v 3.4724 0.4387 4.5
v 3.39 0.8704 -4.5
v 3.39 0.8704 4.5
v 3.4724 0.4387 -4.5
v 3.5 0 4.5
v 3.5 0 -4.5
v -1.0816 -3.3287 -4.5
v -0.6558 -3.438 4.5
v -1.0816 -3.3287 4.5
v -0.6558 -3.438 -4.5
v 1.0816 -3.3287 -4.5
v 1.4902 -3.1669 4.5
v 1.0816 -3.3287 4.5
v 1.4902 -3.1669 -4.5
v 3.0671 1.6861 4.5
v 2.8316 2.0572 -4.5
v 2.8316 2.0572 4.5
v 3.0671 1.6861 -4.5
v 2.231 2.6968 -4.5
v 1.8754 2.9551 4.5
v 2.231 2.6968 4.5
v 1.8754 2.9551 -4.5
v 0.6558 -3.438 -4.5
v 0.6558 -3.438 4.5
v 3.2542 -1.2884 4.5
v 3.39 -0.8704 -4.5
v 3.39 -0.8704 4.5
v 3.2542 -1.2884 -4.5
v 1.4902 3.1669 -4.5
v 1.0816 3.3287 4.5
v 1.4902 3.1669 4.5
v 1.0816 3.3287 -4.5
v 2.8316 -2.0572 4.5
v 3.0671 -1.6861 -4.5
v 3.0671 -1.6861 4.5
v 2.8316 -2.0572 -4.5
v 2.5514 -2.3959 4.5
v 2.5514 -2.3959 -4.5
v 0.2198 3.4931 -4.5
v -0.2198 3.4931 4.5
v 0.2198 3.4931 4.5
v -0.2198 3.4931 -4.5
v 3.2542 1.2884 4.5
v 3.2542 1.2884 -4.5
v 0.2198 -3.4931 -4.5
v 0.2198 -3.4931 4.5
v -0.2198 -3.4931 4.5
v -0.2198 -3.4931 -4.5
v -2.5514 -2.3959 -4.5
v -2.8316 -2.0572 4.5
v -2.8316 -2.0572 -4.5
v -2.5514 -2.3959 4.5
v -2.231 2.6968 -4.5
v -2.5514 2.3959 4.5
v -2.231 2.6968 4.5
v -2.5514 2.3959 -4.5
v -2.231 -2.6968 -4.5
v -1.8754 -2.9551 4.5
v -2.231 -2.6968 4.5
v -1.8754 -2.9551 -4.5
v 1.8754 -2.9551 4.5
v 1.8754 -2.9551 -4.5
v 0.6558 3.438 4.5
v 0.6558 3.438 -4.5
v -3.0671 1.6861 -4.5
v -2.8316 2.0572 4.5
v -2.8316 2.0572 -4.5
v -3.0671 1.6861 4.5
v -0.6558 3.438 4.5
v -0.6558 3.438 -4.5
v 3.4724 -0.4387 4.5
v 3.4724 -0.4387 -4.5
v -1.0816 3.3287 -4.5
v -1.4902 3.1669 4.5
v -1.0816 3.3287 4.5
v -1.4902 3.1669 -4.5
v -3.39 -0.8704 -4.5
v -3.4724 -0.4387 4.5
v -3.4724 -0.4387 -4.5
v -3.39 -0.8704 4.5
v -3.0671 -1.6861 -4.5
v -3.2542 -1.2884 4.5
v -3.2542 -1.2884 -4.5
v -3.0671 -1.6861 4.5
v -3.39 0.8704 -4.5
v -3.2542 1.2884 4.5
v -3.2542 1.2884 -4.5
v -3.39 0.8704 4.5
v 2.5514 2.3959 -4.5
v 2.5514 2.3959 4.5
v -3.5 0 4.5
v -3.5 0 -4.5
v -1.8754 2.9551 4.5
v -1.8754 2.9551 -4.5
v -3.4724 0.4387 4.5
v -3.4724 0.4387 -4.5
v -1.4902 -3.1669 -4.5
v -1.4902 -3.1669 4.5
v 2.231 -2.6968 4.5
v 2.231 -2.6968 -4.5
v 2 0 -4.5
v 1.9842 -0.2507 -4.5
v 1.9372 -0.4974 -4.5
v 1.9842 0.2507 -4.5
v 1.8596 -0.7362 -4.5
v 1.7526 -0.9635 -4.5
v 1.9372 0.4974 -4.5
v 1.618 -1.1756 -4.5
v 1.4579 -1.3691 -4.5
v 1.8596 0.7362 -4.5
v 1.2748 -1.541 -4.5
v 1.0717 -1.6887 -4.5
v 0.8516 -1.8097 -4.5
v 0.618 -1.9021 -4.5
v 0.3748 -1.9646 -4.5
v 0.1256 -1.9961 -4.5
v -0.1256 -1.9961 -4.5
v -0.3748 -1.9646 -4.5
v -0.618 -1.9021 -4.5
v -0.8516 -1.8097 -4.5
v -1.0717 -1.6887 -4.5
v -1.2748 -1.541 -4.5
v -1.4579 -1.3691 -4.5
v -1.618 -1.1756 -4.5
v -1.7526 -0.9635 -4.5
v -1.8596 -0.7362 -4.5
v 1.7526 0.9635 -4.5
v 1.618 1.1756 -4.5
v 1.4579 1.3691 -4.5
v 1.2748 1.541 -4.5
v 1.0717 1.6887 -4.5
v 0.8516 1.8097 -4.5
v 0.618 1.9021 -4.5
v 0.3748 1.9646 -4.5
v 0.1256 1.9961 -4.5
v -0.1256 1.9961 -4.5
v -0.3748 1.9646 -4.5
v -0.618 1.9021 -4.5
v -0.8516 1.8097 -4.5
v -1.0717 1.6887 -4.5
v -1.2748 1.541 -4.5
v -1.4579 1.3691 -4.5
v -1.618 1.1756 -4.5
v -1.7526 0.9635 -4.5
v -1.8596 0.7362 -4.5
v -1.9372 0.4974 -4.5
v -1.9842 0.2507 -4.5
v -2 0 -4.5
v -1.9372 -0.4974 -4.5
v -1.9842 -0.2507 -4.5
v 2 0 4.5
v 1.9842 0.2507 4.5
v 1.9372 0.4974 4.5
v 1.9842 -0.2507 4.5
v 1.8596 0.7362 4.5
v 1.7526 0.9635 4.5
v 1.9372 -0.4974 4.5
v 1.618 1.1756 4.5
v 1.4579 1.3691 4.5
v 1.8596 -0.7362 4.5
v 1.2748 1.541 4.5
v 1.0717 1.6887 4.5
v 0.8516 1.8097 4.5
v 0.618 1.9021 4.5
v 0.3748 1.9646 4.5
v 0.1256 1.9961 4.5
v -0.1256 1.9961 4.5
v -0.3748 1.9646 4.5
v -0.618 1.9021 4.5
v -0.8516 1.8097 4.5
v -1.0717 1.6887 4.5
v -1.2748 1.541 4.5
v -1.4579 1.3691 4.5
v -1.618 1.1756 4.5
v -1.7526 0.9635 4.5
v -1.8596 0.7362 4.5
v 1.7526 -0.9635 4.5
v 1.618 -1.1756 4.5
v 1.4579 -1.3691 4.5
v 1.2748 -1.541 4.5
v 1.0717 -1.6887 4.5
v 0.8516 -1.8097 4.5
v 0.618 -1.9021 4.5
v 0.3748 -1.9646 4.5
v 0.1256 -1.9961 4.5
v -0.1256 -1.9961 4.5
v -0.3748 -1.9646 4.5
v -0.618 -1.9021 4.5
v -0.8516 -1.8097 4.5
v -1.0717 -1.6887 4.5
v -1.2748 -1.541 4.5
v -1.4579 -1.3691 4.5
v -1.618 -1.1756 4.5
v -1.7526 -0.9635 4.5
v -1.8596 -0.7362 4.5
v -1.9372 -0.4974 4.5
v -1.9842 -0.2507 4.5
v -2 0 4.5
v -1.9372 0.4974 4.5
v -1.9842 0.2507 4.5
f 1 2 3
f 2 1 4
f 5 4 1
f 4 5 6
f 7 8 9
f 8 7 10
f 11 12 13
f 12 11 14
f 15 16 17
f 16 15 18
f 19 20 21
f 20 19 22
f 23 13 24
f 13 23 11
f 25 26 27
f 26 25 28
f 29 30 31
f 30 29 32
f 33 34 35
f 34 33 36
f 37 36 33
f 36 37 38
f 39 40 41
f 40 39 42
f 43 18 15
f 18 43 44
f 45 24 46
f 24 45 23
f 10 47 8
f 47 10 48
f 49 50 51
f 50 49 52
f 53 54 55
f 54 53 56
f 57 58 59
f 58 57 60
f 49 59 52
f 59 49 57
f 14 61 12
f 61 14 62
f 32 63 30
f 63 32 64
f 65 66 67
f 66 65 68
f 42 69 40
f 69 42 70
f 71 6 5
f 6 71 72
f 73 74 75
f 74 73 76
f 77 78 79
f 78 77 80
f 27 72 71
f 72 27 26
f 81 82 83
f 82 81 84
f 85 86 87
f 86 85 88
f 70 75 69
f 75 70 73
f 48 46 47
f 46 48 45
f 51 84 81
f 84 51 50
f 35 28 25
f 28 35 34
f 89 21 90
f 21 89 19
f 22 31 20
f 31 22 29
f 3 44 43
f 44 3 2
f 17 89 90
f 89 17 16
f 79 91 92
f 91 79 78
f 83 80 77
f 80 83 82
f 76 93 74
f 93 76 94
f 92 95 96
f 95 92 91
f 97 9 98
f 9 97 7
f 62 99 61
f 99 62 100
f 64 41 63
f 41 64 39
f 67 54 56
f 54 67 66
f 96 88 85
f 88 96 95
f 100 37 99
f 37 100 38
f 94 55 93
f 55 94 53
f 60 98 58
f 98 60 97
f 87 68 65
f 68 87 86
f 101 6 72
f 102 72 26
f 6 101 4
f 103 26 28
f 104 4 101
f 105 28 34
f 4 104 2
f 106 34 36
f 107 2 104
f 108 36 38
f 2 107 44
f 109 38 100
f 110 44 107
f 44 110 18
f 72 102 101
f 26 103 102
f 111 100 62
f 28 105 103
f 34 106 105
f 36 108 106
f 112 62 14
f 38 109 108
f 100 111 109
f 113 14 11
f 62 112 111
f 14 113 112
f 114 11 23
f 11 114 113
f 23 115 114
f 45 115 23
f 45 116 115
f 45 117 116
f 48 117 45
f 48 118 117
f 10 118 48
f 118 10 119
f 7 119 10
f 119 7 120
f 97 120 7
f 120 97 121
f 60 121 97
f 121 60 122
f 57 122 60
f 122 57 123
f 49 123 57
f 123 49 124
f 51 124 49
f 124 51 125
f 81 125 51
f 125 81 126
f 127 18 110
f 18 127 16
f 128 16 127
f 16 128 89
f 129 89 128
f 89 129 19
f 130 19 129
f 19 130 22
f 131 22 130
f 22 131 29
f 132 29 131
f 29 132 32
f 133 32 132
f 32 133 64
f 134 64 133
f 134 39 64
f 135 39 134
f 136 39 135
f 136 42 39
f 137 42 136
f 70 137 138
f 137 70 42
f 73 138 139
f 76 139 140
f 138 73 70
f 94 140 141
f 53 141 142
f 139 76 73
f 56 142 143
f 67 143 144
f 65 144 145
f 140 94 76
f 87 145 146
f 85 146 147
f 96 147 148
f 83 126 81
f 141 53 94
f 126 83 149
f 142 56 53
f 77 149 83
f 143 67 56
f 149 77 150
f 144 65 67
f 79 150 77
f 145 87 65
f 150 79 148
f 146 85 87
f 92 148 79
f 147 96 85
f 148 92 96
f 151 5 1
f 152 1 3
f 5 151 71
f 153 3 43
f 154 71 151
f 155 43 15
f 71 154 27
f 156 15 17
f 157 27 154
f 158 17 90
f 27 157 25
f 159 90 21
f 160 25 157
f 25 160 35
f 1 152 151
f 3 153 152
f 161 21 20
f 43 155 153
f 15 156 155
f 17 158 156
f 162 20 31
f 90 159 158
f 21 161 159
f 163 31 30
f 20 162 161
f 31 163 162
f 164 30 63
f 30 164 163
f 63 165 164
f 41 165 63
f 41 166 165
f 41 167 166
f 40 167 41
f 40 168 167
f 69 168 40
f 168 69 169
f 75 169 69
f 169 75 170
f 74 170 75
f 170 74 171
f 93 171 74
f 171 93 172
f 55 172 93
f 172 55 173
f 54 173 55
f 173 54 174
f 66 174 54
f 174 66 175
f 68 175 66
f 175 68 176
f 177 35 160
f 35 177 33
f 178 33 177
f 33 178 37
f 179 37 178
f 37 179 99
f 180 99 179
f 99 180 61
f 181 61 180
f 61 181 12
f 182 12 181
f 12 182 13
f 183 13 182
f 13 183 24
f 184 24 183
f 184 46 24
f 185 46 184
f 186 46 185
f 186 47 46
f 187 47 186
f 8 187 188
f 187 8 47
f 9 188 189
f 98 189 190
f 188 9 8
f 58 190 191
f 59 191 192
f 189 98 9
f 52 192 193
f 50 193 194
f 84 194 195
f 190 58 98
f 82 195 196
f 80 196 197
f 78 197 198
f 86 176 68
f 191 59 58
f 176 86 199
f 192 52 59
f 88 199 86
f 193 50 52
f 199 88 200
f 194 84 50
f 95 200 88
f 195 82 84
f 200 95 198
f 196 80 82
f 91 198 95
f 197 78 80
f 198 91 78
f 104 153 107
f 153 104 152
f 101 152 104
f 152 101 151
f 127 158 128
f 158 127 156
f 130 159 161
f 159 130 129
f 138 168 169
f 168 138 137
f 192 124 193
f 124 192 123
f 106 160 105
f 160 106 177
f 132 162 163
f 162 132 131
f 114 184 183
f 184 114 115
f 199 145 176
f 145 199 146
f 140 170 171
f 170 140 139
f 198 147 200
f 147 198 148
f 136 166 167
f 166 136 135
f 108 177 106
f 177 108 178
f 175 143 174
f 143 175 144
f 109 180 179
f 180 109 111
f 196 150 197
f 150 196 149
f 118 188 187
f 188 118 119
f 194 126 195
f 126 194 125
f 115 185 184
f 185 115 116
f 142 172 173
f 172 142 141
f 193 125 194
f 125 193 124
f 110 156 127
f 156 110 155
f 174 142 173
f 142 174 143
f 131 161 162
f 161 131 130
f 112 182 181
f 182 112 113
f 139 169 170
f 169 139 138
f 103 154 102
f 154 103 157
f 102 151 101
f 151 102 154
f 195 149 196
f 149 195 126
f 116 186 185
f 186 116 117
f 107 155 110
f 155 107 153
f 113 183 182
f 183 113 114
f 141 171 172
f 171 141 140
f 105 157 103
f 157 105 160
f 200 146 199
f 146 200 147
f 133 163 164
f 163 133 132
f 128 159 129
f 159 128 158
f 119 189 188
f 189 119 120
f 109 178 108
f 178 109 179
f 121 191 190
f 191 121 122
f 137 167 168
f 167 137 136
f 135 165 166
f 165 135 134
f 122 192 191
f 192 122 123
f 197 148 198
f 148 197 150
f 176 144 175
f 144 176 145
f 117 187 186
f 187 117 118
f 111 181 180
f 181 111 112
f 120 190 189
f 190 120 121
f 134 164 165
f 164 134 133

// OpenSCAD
$fn = 50;


difference() {
	union() {
		translate(v = [0, 0, -4.5000000000]) {
			cylinder(h = 9, r = 3.5000000000);
		}
	}
	union() {
		translate(v = [0, 0, -100.0000000000]) {
			cylinder(h = 200, r = 2.0000000000);
		}
	}
}
